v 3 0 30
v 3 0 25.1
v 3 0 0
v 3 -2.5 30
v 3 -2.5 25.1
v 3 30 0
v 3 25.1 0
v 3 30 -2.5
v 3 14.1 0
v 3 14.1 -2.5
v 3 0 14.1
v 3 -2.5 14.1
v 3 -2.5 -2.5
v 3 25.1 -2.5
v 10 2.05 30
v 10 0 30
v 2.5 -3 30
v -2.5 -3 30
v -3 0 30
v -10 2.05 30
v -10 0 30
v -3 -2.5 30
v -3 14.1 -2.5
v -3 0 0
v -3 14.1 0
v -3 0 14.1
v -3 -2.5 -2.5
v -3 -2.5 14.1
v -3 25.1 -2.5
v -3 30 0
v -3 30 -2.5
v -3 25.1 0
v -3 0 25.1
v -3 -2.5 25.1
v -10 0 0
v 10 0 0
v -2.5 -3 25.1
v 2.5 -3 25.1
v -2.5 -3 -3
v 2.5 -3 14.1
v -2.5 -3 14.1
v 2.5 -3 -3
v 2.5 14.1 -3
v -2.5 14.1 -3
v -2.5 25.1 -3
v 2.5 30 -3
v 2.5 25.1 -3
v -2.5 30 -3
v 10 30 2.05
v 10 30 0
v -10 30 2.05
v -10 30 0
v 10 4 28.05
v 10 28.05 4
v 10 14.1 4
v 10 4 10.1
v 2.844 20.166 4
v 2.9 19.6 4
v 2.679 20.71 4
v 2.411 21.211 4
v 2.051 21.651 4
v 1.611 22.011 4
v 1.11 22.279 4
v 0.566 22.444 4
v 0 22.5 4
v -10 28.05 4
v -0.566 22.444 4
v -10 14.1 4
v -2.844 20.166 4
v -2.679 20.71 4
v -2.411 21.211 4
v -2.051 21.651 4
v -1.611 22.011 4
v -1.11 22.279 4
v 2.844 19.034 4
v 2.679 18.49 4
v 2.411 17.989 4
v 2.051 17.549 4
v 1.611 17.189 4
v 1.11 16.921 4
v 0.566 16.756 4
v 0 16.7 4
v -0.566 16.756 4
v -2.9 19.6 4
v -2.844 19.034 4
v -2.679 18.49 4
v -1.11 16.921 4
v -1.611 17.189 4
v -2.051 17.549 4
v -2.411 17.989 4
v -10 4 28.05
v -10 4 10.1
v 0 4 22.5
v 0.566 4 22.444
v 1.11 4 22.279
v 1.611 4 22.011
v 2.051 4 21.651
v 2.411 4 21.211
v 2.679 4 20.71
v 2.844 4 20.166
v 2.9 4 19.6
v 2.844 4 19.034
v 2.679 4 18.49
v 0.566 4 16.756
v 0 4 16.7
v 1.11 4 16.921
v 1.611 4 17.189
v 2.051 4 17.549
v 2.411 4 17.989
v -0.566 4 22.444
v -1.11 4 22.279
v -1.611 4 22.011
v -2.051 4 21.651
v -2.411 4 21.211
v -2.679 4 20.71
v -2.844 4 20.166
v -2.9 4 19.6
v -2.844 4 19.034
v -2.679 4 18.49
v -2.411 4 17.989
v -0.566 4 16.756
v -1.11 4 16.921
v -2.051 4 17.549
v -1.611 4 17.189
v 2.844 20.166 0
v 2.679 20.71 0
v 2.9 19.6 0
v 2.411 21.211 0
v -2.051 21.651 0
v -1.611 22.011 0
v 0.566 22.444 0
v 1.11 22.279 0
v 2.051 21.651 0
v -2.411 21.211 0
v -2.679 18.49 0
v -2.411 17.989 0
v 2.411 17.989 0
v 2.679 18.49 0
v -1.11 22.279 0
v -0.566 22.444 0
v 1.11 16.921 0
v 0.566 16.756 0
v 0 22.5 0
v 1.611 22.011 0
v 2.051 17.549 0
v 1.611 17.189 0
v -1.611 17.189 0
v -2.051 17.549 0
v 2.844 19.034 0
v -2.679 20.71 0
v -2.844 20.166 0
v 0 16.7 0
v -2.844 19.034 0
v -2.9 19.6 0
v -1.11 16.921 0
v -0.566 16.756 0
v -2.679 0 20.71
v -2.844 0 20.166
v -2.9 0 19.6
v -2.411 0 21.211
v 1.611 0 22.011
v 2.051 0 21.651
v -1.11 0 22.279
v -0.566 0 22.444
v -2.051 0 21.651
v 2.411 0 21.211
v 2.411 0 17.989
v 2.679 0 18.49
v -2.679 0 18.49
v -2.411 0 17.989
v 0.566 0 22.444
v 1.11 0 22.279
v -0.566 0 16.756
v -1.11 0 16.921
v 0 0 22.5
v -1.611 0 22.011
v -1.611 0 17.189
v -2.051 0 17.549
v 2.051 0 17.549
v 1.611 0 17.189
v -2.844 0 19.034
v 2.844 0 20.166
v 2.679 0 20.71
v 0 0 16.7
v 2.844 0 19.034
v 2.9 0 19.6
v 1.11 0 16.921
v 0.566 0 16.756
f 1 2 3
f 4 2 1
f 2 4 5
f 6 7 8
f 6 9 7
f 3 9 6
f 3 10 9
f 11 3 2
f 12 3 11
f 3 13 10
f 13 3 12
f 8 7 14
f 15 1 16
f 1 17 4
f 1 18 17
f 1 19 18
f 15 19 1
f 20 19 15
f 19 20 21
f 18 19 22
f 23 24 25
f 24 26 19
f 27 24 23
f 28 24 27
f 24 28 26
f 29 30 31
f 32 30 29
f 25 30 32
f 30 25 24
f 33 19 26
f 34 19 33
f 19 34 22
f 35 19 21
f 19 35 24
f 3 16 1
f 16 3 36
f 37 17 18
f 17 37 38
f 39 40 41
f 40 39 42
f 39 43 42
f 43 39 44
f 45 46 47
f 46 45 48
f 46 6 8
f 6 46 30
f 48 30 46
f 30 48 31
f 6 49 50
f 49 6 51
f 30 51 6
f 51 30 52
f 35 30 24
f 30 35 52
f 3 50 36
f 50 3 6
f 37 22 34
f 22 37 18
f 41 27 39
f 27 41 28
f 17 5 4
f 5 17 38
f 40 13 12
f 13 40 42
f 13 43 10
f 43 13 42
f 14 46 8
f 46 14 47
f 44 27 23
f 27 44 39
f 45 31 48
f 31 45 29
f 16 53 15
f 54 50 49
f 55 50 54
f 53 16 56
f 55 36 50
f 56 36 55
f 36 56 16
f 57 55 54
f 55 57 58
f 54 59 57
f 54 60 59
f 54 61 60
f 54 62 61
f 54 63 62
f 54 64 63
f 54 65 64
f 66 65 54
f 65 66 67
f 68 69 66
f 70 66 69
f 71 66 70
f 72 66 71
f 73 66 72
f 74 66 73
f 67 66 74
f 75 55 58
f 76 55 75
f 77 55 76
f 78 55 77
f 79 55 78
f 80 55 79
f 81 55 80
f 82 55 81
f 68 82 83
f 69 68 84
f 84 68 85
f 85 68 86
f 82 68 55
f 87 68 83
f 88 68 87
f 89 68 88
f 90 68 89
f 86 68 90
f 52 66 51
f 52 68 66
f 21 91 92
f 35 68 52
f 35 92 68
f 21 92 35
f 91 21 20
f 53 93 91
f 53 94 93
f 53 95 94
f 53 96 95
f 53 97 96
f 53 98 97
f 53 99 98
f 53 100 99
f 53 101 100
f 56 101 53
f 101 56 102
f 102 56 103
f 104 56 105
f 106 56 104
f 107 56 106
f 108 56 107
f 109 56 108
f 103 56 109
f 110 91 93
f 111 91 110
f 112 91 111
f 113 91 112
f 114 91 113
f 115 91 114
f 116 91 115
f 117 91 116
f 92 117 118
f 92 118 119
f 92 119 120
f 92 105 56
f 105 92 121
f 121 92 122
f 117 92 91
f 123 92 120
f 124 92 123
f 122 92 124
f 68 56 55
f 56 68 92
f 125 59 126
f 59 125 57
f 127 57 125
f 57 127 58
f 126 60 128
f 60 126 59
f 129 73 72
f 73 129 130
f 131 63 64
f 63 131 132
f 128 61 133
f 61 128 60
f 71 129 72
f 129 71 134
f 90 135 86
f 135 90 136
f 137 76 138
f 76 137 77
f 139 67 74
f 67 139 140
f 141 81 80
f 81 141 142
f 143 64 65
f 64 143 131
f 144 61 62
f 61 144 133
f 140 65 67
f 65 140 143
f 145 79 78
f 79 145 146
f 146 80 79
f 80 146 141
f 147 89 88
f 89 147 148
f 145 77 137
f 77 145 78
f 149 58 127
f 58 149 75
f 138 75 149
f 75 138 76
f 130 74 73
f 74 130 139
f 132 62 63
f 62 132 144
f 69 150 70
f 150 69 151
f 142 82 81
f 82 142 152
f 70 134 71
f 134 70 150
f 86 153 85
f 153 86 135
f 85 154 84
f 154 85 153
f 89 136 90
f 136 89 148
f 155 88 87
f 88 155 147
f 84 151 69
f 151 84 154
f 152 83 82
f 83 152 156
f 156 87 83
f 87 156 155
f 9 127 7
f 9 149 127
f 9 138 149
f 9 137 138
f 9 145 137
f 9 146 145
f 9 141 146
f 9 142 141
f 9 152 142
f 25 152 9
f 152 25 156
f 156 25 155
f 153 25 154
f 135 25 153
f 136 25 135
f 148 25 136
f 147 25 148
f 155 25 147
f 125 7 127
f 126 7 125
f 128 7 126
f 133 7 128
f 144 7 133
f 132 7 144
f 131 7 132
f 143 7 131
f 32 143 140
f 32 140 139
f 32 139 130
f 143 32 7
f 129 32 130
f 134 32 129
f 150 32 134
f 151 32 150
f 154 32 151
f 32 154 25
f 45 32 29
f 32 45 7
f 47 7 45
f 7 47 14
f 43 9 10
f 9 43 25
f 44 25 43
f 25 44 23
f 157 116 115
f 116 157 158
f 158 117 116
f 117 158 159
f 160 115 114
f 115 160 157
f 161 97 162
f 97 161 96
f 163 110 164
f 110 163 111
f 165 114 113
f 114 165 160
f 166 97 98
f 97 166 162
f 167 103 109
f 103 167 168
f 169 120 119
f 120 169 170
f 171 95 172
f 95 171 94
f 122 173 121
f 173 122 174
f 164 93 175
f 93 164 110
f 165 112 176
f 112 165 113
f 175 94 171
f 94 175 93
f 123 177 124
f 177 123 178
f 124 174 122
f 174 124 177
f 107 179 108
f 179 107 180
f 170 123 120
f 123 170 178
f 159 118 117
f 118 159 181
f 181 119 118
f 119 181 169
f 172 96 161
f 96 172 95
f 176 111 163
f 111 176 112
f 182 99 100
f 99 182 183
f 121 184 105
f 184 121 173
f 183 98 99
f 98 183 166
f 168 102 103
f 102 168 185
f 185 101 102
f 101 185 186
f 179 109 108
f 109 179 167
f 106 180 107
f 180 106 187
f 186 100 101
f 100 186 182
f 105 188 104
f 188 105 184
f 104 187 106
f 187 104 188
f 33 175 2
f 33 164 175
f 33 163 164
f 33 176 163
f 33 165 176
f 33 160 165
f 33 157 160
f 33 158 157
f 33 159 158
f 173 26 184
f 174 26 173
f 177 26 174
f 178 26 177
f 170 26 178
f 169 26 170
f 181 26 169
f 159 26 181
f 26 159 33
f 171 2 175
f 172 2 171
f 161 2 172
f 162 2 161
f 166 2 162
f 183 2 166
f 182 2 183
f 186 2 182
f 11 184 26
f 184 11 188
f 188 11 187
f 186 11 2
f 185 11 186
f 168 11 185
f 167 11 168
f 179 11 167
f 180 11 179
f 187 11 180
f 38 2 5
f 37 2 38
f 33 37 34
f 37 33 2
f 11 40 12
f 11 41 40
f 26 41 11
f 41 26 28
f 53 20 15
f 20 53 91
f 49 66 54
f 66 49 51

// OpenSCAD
/*
* Ultimate Customizable Corner Brackets
* https://www.thingiverse.com/thing:3007147
* By Daniel Hultgren https://www.thingiverse.com/Hultis
* Version 1.3
* 2020-05-07
*/

/* [Basic settings] */

// The width of your aluminium extrusion.
extrusion_width = 20;
// The side length of the bracket.
side_length = 30;
// The thickness of the wall facing the extrusion.
side_thickness = 4;
// How many screw holes are are on the top side.
top_screw_count = 1;
// How many screw holes are are on the bottom side.
bottom_screw_count = 1;
// Screw diameter (4 for M4, 5 for M5 and so on).
screw_hole_size = 5;
// Screw head diameter.
screw_head_size = 10;


/* [Advanced settings] */

// How deep screw heads should be recessed. Obviously don't make this larger than side_thickness.
recessed_screw_depth = 0;
// How much to elongate the holes on top.
top_screw_elongation = 0;
// How much to elongate the holes on bottom.
bottom_screw_elongation = 0;
// The part which goes into your extrusion. Generally this should be slightly smaller than the actual hole, but YMMV.
extrusion_insert_width = 6;
// Use this when you want multiple connected brackets, for 4020 and similar. 20 for 2020 extrusions, 30 for 3030 and so on.
extrusion_base = 20;
// Set how many walls you want. One wall doesn't play well with multiple bracket mode.
wall_count = 0; // [0 : 1 : 2]
// Set lower if you think the side walls are too thick.
max_wall_thickness = 8;
// Set this if you want to use these above your existing brackets. Typical 2020 brackets have a size of 20 and side thickness of 3.
cutout_size = 0;
cutout_side_thickness = 3;
// Decrease this if you don't want extrusion inserts on both sides. Intended for using these entirely or partially on non-extrusions.
extrusion_insert_count = 2; // [0 : 1 : 2]
// Set this to control how much space the nuts have. Hammer nuts should just work but for t nuts you will need to set a specific width.
specific_bottom_nut_space = 0;
// Bracket angle
bracket_angle = 90; // [90 : 1 : 180]





/**********************************
   End of config, here be dragons
**********************************/





/* [Hidden] */
// preview[view:north east, tilt:top diagonal]

// You might want to decrease this if you don't use hammer nuts
extrusion_insert_height = 3;

cutout_margin = 0.3;
screw_head_margin = 0.5;
e = 0.05;
top_screw_distance = screw_distance_from_edge(top_screw_count, top_screw_elongation);
bottom_screw_distance = screw_distance_from_edge(bottom_screw_count, bottom_screw_elongation);
screw_distance_from_edge = max(top_screw_distance, bottom_screw_distance);

bridge_size = min(
    bridge(top_screw_count, screw_head_size+top_screw_elongation, top_screw_distance),
    bridge(bottom_screw_count, screw_head_size+bottom_screw_elongation, bottom_screw_distance));

main();

module main() {
    bracket_count = round(extrusion_width / extrusion_base);
    extrusion_width = extrusion_width/bracket_count;
    wall_thickness = min([max_wall_thickness, (extrusion_width - screw_head_size - screw_head_margin) / 2]);
    union() {
        for(i=[0:bracket_count-1]) {
            translate([i*extrusion_width, 0, 0]) bracket(extrusion_width, wall_thickness);
        }
    }
}

module bracket(width, wall_thickness, is_first) {
    difference() {
        union() {
            translate([-width/2, 0, 0]) cube([width, side_length, side_thickness]); // Bottom wall
            rotate([bracket_angle-90,0,0]) {
                translate([-width/2, side_thickness, 0]) rotate([90, 0, 0]) cube([width, side_length, side_thickness]); // Top wall
            }
            if (wall_count >= 1) {
                translate([width/2 - wall_thickness, 0, 0]) rotate([90, 0, 90]) wall(width, side_length, wall_thickness); // Left wall
            }
            if (wall_count >= 2) {
                translate([-width/2, 0, 0]) rotate([90, 0, 90]) wall(width, side_length, wall_thickness); // Right wall
            }
            
            // Make the parts which go into the extrusions, with chamfers
            if (extrusion_insert_count > 0) difference() {
                union() {
                    if (extrusion_insert_count > 0) {
                        translate([0, 0, 0]) rotate([90, 0, 180]) extrusion_insert();
                    }
                    if (extrusion_insert_count > 1) {
                        rotate([bracket_angle-90,0,0]) extrusion_insert();
                        extrusion_insert_corner();
                    }
                    
                }
                // Make chamfers
                rotate([bracket_angle-90,0,0]) extrusion_chamfer();
                translate([0, 0, 0]) rotate([90, 0, 180]) extrusion_chamfer();
            }
            bridge(bridge_size, width, wall_thickness);
        };

        // Cutoff for easier printing
        cutoff_amount = 0.5*(180-bracket_angle)/90 * side_thickness;
        magic_height_number = 42;
        translate([0, side_length+e, side_thickness-cutoff_amount])
            rotate([90-(180-bracket_angle)/2, 0, 0])
            linear_extrude(height=(side_length+e)*2, convexity=2)
            polygon(points = [
                [width/2+e, 0],
                [-width/2-e, 0],
                [-width/2-e, magic_height_number],
                [width/2+e, magic_height_number]
            ]);
        
        // Make screw holes
        side_screw_holes(bottom_screw_count, bottom_screw_distance, bottom_screw_elongation); // Bottom screws
        rotate([bracket_angle-90,0,0]) {
            rotate([270, 180, 0]) side_screw_holes(top_screw_count, top_screw_distance, top_screw_elongation); // Top screws
        }
        cutout();
    }
}

module side_screw_holes(screw_count, screw_distance_from_edge, screw_elongation, screw_distance) {
    screw_total_distance = side_length - screw_distance_from_edge - bridge_size - side_thickness - screw_head_size/2 - screw_head_margin - screw_elongation/2;
    screw_distance = screw_total_distance/(max(1, screw_count-1));
    for(i=[0:screw_count-1]) {
        translate([0, side_length - screw_distance_from_edge - i*screw_distance, -e]) screw(screw_hole_size, screw_head_size, screw_elongation);
    }
}

module cutout() {
    zero = -e-extrusion_insert_height;
    full_width = cutout_size+cutout_margin;
    if (cutout_size > 0) {
        assert(bracket_angle == 90, "Can't use cutout with bracket angles other than 90 degrees");
        translate([extrusion_width/2+e, 0, 0])
            rotate([0, -90, 0])
            linear_extrude(height = extrusion_width+2*e, convexity = 2)
            polygon(points = [
            [zero, zero],
            [zero, full_width],
            [cutout_side_thickness+cutout_margin, full_width],
            [full_width, cutout_side_thickness+cutout_margin],
            [full_width, zero]]);
    }
}

module wall(w, l, wall_thickness) {
    linear_extrude(height = wall_thickness, convexity = 2)
        polygon(points = [[side_thickness*tan((180-bracket_angle)/2), side_thickness],
                          [side_length, side_thickness],
                          [-side_length*sin(bracket_angle-90)+side_thickness*cos(bracket_angle-90), side_length*cos(bracket_angle-90)+side_thickness*sin(bracket_angle-90)]]);
    }

module screw(hole_size, head_size, screw_elongation = 0) {
    if (screw_elongation > 0) {
        translate([0,screw_elongation/2,-0.5]) cylinder(h = side_thickness + 1, r = hole_size / 2 + 0.4, $fn = 32); // Screw hole
        translate([-hole_size/2-0.4,-screw_elongation/2,-0.5]) cube([hole_size + 0.8, screw_elongation, side_thickness + 1]); // Hole mid part
        translate([0,-screw_elongation/2,-0.5]) cylinder(h = side_thickness + 1, r = hole_size / 2 + 0.4, $fn = 32); // Screw hole
    } else {
        translate([0,0,-0.5]) cylinder(h = side_thickness + 1, r = hole_size / 2 + 0.4, $fn = 32); // Screw hole
    }
    if(recessed_screw_depth > 0) {
        assert(screw_elongation == 0, "Can't use recessed screws with elongated screws");
        translate([0, 0, side_thickness - recessed_screw_depth]) cylinder(h = recessed_screw_depth+1, r = (head_size + screw_head_margin)/2, $fn = 32);
    }
    bottom_nut_space = specific_bottom_nut_space > 0
        ? specific_bottom_nut_space
        : max(screw_hole_size*2+1, screw_hole_size+screw_elongation+1); // This works for typical hammer nuts
    translate([-extrusion_insert_width/2-e, -bottom_nut_space/2, -extrusion_insert_height-e]) cube([extrusion_insert_width + 2*e, bottom_nut_space,extrusion_insert_height+2*e]); // Remove extrusion insert below screw
    #translate([0, 0, side_thickness+2*e]) cylinder(h = 3, r = head_size / 2, $fn = 32); // Screw head, to make sure they don't hit each other
}

module bridge(size, width, wall_thickness) {
    c = screw_head_size / 3;
    union() {
        translate([width/2, 0, 0])
            rotate([0, 270, 0])
            linear_extrude(height = width, convexity = 2)
             polygon([[side_thickness, side_thickness*tan((180-bracket_angle)/2)],
                       [size*cos(bracket_angle-90)+side_thickness*sin(bracket_angle-90), -(size)*sin(bracket_angle-90)+side_thickness*cos(bracket_angle-90)], 
                       [side_thickness, side_thickness + size]]); // Main bridge
        if (wall_count >= 1) {
            translate([width/2-wall_thickness-c, 0, 0]) bridge_side(size, [[0, 0], [c, 0], [c, c]]); // Left
        }
        if (wall_count >= 2) {
            translate([-width/2+wall_thickness, 0, 0]) bridge_side(size, [[0, 0], [c, 0], [0, c]]); // Right
        }
    }
}

module bridge_side(size, polygon_points){
    hull() {
        translate([0, size+side_thickness, side_thickness-e]) linear_extrude(height = e, convexity = 2) polygon(points = polygon_points);
        translate([0, -(size)*sin(bracket_angle-90)+side_thickness*cos(bracket_angle-90), size*cos(bracket_angle-90)+side_thickness*sin(bracket_angle-90)]) 
            rotate([bracket_angle,0,0])
                linear_extrude(height = e, convexity = 2)
                    polygon(points = polygon_points);
    }
}

module extrusion_insert() {
    translate([-extrusion_insert_width/2, -extrusion_insert_height, 0]) cube([extrusion_insert_width, extrusion_insert_height, side_length]);
}

module extrusion_chamfer(height = .5) {
    x = extrusion_insert_width;
    z = side_length + extrusion_insert_height;
    length = sqrt(height * height * 2);
    translate([-extrusion_insert_width/2, -extrusion_insert_height, -extrusion_insert_height]) union() {
        translate([0, -height, -e]) rotate([0, 0, 45]) cube([length, length, z+2*e]);
        translate([x, -height, -e]) rotate([0, 0, 45]) cube([length, length, z+2*e]);
    }
}
module extrusion_insert_corner() {
    translate([extrusion_insert_width/2,0,-extrusion_insert_height])
        rotate([90,0,-90])
        linear_extrude(extrusion_insert_width, center = false, convexity = 10, twist = 0)
            polygon(points=[[0,0],
                           [0,extrusion_insert_height],
                           [extrusion_insert_height*cos(bracket_angle-90),(extrusion_insert_height-extrusion_insert_height*sin(bracket_angle-90))],
                           [extrusion_insert_height*tan((180-bracket_angle)/2),0]]);
    }

function screw_distance_from_edge(screw_count, screw_elongation) =
    screw_count > 1
        ? max(screw_head_size/2 + screw_elongation/2, min(6.5, side_length/3)) + screw_head_margin/2
        : max((side_length-side_thickness)/2.5, screw_hole_size+screw_elongation/2);

function bridge(screw_count, total_screw_size, screw_distance_from_edge) =
    screw_count > 1
        ? min((side_length - side_thickness - 2*total_screw_size + cutout_size + cutout_margin) / (side_length/20),
            max(side_length - side_thickness - total_screw_size*screw_count, 0))
        : side_length - screw_distance_from_edge - total_screw_size / 2 - side_thickness - screw_head_margin;
